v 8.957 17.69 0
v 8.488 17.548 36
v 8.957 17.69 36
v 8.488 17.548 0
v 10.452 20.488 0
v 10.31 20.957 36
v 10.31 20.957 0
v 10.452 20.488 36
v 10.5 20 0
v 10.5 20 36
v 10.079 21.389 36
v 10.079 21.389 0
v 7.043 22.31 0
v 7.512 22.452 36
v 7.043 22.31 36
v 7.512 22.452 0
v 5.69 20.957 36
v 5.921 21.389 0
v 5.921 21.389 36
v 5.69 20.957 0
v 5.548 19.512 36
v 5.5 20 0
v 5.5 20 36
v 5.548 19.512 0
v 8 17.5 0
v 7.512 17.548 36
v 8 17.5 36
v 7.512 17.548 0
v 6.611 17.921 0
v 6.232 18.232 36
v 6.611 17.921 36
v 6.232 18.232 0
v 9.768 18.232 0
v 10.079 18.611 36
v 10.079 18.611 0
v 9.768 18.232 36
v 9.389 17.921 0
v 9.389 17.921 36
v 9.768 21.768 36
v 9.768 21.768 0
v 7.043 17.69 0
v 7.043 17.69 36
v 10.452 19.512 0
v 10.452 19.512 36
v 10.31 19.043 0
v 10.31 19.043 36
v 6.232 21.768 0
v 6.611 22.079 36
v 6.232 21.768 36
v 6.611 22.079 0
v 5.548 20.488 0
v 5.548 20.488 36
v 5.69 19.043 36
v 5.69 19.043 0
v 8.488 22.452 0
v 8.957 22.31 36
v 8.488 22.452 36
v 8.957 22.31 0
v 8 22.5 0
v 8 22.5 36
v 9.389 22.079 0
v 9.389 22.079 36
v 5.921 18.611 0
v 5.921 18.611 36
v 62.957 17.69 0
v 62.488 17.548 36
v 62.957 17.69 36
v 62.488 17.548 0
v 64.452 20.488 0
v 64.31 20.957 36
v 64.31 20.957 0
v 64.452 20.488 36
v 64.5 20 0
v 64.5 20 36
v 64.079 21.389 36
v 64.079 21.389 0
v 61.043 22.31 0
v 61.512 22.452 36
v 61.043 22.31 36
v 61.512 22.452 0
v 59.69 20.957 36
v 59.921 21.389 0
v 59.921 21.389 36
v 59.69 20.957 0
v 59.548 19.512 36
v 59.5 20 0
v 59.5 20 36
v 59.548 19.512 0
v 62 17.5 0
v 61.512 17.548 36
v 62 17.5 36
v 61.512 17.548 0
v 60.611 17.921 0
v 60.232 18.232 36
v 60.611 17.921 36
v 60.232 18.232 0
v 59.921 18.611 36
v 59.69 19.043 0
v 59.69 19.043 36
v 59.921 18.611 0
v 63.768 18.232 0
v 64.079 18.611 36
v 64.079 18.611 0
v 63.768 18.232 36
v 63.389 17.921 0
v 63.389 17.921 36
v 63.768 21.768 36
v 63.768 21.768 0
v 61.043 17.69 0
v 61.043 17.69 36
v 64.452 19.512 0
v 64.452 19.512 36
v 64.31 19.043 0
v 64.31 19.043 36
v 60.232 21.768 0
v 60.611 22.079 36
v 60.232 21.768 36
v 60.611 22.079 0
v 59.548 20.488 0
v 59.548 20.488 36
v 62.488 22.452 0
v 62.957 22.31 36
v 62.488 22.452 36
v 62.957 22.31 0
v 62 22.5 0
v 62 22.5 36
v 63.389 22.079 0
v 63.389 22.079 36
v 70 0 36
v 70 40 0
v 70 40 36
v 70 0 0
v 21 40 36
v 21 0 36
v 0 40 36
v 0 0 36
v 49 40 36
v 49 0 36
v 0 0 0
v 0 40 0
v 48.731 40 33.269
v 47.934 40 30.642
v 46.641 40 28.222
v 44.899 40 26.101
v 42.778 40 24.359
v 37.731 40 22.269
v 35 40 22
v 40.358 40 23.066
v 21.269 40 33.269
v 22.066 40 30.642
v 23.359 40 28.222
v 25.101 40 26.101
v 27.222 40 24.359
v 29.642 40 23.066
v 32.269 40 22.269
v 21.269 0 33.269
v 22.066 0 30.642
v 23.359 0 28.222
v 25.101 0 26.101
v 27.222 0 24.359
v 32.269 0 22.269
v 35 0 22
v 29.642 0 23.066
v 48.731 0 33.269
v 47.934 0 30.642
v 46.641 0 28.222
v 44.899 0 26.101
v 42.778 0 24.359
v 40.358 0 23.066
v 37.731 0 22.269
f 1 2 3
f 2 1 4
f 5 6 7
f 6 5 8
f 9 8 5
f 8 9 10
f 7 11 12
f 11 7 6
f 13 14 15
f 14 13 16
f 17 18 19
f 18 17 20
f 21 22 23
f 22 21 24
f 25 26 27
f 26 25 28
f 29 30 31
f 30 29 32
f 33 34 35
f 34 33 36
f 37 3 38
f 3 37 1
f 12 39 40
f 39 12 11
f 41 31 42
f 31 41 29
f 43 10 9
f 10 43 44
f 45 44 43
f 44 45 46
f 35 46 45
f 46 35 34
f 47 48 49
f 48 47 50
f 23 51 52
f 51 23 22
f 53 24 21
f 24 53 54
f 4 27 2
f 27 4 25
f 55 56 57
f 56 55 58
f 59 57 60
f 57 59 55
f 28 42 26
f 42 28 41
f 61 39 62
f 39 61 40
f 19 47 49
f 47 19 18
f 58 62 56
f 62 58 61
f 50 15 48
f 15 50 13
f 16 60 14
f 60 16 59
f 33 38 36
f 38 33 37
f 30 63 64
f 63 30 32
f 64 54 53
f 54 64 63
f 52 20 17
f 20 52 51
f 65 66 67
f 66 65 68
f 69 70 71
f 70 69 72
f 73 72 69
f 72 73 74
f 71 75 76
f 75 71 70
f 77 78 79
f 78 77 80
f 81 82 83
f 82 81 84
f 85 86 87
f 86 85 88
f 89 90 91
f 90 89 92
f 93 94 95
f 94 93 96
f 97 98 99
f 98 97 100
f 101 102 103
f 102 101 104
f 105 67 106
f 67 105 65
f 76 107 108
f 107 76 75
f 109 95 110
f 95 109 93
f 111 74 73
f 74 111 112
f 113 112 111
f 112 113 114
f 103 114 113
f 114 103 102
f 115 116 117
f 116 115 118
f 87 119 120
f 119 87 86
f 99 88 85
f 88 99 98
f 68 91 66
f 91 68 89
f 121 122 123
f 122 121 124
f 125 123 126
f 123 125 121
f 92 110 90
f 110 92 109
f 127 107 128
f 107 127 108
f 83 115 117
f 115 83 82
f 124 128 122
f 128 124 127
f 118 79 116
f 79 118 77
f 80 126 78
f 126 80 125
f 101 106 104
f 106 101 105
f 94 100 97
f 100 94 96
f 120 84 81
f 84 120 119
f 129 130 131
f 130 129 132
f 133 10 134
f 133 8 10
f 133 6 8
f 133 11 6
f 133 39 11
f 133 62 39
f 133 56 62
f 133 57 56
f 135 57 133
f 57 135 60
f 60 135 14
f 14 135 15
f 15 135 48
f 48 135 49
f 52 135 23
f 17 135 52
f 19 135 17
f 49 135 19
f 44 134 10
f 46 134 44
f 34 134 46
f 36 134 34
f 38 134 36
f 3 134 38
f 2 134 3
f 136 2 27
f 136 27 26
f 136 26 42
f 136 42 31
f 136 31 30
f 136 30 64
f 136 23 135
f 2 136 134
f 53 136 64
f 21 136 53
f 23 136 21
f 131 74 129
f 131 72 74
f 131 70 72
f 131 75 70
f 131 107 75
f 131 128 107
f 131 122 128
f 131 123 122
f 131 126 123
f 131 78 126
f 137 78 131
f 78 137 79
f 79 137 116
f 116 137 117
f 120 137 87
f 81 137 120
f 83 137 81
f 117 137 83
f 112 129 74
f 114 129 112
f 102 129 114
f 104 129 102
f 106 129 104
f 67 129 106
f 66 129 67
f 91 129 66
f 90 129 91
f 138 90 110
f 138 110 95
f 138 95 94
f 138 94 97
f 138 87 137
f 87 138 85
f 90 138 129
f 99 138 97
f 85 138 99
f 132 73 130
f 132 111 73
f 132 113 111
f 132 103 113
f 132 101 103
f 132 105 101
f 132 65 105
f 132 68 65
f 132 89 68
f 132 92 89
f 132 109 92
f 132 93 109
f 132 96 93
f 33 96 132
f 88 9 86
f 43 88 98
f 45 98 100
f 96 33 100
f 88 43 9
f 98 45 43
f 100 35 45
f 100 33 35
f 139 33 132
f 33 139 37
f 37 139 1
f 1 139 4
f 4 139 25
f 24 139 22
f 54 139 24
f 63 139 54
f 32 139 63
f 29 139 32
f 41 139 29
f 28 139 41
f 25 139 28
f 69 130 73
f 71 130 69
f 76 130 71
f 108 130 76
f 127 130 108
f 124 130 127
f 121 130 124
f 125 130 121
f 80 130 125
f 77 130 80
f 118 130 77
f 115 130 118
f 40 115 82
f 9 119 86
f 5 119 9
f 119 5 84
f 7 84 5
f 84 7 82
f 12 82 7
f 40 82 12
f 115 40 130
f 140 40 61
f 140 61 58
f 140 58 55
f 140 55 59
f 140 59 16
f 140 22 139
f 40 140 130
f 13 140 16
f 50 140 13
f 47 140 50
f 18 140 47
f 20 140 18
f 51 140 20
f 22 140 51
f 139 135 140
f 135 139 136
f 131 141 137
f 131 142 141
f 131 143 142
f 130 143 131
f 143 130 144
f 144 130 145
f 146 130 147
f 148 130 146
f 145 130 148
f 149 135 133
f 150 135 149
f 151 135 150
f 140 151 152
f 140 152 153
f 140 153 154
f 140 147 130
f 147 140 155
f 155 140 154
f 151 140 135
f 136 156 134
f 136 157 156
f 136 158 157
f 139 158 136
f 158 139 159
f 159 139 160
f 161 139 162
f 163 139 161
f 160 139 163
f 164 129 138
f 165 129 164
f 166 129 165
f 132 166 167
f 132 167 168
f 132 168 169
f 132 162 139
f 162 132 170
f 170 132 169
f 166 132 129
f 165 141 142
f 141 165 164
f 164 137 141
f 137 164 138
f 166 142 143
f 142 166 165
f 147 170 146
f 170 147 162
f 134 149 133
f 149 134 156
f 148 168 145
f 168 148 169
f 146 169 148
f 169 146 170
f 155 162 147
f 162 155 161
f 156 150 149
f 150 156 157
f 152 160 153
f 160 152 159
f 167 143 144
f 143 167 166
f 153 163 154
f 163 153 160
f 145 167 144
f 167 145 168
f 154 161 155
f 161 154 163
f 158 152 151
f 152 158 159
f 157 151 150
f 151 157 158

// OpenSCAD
$fn = 32;

// ----------------------------------------------------------------------
// Saddle clamp: plain shaft clamp
// ----------------------------------------------------------------------

// --- parameters (mm) ---
blk_l = 70;               // block length, X
blk_w = 40;               // block width, Y
blk_h = 36;               // block height
clamp_r = 14;             // shaft groove radius
hole_r = 2.5;             // bolt hole radius
hole_m = 8;               // bolt hole margin from the ends
fit_tol = 0.1;            // tolerance for press fits, mm
free_tol = 0.3;           // tolerance for clearance fits, mm

saw_depth = clamp_r + 3;  // saw kerf depth

difference() {
  cube([blk_l, blk_w, blk_h]);
  translate([blk_l / 2, -1, blk_h])
    rotate([-90, 0, 0])
      cylinder(h = blk_w + 2, r = clamp_r);
  for (sx = [0, 1])
    translate([sx ? blk_l - hole_m : hole_m, blk_w / 2, -1])
      cylinder(r = hole_r, h = blk_h + 2);
}
